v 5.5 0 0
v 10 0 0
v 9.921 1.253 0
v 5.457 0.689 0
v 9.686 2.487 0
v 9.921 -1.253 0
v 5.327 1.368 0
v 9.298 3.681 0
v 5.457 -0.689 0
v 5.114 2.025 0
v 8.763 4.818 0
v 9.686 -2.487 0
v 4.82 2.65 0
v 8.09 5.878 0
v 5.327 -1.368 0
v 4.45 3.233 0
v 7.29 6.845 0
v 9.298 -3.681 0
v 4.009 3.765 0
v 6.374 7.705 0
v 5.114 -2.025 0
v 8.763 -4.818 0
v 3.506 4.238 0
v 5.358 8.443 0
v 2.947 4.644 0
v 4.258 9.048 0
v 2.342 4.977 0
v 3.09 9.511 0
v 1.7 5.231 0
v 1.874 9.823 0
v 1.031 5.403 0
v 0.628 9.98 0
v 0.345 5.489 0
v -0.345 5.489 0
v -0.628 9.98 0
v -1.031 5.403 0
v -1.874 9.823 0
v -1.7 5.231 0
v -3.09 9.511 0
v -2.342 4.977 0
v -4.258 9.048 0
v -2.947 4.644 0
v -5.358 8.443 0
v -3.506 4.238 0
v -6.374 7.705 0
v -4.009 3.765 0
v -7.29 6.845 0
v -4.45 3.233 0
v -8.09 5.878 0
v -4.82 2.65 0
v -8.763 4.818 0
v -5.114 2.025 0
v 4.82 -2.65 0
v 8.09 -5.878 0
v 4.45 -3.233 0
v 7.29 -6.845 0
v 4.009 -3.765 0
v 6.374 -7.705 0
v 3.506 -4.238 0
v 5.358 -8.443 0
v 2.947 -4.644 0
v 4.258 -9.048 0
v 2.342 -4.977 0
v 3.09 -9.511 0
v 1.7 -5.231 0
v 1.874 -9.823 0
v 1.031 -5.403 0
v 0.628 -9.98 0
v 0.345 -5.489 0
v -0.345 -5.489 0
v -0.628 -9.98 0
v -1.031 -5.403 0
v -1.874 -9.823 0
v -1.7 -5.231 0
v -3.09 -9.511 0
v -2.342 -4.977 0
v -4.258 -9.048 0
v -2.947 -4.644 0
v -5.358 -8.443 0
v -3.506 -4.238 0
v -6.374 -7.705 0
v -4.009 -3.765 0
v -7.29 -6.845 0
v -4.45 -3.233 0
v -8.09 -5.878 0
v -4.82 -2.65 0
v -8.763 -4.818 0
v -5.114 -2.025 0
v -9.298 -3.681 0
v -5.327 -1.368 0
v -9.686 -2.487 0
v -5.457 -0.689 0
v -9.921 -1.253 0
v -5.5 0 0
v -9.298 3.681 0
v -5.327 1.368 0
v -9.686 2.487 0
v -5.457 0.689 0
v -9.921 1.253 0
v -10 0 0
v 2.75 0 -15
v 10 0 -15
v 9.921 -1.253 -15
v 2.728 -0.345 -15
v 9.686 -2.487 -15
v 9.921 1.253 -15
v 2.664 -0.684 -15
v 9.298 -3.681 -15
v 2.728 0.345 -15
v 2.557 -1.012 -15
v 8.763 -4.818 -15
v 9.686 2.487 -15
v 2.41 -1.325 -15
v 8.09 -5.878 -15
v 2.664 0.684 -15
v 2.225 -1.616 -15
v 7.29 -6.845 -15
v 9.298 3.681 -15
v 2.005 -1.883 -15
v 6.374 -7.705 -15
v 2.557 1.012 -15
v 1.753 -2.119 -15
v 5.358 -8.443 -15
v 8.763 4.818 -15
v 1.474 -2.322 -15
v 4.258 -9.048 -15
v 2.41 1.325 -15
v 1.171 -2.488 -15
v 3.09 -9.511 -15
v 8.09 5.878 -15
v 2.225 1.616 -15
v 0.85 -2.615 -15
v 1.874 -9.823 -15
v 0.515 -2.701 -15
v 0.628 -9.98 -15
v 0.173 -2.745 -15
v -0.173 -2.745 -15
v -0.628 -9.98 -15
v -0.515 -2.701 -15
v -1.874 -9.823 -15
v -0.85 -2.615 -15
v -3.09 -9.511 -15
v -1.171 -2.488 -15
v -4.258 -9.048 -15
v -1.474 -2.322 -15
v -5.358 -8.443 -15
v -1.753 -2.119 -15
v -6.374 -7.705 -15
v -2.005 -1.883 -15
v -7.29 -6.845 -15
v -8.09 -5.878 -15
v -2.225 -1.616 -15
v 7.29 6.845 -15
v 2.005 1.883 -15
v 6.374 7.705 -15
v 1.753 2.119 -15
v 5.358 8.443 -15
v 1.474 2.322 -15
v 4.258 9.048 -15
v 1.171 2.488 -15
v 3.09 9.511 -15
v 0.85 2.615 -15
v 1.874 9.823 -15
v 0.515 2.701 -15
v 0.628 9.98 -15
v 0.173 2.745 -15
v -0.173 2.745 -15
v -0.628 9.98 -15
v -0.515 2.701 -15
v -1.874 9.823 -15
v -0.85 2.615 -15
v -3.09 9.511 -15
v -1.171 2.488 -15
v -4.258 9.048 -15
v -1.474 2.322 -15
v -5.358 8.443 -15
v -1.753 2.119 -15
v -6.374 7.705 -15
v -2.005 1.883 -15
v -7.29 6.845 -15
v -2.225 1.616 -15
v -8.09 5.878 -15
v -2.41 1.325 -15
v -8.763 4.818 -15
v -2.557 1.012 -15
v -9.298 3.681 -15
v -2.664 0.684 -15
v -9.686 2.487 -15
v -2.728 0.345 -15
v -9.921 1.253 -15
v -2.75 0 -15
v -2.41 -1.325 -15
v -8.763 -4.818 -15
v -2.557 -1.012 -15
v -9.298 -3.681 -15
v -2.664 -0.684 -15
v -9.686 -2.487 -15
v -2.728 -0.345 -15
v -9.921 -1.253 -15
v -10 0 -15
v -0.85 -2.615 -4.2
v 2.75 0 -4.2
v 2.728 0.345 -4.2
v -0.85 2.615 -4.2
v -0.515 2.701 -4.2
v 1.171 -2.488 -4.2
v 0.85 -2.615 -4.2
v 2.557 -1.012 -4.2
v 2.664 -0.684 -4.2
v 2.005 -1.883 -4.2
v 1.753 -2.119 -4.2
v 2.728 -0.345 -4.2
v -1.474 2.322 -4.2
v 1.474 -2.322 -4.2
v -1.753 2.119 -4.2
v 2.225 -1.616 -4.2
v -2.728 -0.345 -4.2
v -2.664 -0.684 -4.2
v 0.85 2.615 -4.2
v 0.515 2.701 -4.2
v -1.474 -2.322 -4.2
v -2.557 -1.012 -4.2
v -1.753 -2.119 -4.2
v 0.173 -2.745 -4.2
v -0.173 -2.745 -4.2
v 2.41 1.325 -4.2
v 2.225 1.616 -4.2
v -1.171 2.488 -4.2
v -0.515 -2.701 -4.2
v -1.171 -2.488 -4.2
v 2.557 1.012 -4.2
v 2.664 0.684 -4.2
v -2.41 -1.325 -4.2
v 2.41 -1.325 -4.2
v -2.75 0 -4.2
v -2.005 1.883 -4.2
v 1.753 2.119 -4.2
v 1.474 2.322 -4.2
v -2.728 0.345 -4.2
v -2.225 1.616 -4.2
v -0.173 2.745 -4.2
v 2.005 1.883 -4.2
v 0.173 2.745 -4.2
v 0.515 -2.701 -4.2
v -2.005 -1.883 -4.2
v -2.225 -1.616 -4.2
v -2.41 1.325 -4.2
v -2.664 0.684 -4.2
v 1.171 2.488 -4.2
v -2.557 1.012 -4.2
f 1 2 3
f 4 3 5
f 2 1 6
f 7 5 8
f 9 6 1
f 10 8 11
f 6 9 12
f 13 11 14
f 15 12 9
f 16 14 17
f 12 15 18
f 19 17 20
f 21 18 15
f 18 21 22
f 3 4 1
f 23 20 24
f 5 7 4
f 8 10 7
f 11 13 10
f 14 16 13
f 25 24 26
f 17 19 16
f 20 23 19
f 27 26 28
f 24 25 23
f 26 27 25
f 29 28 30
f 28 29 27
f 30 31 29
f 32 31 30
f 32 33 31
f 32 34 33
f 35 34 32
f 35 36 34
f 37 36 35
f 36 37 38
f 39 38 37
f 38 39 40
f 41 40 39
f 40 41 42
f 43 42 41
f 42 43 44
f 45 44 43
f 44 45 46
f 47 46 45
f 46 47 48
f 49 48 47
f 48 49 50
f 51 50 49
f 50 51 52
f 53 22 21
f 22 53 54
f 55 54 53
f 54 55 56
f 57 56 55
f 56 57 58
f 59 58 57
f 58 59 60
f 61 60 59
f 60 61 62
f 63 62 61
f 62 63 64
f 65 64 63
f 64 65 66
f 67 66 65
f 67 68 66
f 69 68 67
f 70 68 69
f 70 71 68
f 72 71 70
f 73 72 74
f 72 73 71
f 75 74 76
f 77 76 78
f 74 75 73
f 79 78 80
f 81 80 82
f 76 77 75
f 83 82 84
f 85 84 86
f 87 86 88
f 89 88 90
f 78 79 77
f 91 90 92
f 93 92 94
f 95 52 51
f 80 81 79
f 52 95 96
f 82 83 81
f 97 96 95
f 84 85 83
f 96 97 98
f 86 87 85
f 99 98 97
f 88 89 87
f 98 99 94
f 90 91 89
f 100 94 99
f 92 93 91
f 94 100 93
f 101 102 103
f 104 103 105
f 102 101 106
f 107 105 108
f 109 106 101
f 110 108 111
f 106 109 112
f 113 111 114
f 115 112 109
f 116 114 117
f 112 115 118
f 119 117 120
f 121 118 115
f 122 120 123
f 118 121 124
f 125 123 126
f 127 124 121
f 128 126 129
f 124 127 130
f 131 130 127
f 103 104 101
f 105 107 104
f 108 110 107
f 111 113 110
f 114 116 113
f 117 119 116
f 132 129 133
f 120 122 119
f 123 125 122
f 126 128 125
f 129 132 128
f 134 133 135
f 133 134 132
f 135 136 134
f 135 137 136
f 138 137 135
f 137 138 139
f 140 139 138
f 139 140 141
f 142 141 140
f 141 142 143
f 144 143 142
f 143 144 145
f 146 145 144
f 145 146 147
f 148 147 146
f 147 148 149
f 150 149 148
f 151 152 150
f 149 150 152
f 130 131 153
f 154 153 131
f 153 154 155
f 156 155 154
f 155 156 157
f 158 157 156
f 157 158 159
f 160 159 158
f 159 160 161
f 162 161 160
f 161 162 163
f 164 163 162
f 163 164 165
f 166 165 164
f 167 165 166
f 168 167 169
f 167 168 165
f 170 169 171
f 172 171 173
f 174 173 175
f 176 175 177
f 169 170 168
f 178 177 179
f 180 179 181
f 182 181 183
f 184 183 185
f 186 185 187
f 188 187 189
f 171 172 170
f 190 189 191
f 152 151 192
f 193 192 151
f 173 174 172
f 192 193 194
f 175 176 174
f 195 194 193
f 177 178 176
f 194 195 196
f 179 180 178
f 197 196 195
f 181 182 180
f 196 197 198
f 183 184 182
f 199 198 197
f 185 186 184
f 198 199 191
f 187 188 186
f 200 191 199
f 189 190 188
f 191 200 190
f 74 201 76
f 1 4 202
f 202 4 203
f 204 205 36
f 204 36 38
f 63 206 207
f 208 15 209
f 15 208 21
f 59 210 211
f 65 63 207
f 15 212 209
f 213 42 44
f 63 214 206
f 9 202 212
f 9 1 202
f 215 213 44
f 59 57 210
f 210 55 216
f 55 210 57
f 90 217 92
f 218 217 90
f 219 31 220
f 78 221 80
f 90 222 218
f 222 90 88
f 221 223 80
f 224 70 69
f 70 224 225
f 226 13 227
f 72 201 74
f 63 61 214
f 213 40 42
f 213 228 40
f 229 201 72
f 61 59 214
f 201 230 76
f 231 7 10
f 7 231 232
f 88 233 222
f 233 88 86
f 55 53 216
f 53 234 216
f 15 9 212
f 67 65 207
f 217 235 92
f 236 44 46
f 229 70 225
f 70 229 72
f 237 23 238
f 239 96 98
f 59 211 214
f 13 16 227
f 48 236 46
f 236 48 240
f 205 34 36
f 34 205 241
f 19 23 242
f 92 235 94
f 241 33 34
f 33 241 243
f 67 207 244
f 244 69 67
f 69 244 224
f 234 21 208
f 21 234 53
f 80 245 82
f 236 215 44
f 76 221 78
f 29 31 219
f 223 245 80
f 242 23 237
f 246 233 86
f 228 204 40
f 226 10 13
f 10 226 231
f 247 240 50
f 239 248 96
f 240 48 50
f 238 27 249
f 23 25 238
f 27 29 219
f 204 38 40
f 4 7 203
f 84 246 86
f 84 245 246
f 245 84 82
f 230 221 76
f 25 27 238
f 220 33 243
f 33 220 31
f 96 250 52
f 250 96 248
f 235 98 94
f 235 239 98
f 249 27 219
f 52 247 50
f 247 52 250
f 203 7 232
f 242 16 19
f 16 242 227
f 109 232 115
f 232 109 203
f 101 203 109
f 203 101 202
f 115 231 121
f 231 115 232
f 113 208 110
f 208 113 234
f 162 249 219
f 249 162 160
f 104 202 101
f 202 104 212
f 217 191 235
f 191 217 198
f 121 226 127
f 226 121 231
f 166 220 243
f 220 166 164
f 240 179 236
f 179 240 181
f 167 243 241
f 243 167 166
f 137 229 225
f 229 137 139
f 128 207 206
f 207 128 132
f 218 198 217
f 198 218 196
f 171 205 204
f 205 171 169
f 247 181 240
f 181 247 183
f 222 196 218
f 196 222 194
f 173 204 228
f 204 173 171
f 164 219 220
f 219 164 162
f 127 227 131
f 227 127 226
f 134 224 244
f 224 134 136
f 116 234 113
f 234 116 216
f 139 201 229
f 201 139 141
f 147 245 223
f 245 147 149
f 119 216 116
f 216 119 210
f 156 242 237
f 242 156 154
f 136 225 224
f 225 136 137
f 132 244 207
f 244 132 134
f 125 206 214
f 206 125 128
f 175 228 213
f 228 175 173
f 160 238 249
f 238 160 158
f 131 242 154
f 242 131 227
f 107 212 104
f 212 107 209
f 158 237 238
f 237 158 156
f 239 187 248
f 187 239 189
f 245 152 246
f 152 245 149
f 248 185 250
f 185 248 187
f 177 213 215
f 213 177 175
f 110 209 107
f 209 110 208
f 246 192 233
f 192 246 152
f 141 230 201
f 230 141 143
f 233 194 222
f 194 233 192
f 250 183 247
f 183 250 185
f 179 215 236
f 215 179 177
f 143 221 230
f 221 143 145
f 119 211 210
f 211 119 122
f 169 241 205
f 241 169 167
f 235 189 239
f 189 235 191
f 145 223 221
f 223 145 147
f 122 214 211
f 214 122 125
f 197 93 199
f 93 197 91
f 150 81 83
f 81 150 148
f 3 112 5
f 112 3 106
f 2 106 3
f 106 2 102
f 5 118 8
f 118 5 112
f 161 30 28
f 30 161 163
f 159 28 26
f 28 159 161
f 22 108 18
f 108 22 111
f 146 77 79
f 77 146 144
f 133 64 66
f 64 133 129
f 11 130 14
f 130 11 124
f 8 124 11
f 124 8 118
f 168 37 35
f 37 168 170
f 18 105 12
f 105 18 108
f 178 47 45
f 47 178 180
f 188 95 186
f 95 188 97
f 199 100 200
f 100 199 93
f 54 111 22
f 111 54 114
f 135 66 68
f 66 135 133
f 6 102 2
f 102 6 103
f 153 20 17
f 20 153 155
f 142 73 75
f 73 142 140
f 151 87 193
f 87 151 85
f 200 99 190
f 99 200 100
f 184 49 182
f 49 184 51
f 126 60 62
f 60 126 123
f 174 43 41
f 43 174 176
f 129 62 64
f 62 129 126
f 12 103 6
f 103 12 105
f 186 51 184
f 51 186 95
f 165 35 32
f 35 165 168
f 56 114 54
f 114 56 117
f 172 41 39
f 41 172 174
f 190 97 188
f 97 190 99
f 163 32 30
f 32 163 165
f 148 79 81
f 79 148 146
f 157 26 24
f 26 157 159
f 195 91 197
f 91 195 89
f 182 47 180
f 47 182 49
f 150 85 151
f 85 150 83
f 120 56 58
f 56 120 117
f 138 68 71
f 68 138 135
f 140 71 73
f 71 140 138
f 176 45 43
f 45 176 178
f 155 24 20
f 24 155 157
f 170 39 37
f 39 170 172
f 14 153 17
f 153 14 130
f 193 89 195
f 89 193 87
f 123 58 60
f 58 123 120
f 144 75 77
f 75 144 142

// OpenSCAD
$fn = 50;


difference() {
	union() {
		translate(v = [0, 0, -15.0000000000]) {
			cylinder(h = 15, r = 10.0000000000);
		}
	}
	union() {
		translate(v = [0, 0, 0]) {
			rotate(a = [0, 0, 0]) {
				difference() {
					union() {
						#translate(v = [0, 0, -15.0000000000]) {
							cylinder(h = 15, r = 2.2500000000);
						}
						#translate(v = [0, 0, -4.2000000000]) {
							cylinder(h = 4.2000000000, r1 = 2.7500000000, r2 = 5.5000000000);
						}
						#translate(v = [0, 0, -15.0000000000]) {
							cylinder(h = 15, r = 2.7500000000);
						}
						#translate(v = [0, 0, -15.0000000000]) {
							cylinder(h = 15, r = 2.2500000000);
						}
					}
					union();
				}
			}
		}
	}
}
